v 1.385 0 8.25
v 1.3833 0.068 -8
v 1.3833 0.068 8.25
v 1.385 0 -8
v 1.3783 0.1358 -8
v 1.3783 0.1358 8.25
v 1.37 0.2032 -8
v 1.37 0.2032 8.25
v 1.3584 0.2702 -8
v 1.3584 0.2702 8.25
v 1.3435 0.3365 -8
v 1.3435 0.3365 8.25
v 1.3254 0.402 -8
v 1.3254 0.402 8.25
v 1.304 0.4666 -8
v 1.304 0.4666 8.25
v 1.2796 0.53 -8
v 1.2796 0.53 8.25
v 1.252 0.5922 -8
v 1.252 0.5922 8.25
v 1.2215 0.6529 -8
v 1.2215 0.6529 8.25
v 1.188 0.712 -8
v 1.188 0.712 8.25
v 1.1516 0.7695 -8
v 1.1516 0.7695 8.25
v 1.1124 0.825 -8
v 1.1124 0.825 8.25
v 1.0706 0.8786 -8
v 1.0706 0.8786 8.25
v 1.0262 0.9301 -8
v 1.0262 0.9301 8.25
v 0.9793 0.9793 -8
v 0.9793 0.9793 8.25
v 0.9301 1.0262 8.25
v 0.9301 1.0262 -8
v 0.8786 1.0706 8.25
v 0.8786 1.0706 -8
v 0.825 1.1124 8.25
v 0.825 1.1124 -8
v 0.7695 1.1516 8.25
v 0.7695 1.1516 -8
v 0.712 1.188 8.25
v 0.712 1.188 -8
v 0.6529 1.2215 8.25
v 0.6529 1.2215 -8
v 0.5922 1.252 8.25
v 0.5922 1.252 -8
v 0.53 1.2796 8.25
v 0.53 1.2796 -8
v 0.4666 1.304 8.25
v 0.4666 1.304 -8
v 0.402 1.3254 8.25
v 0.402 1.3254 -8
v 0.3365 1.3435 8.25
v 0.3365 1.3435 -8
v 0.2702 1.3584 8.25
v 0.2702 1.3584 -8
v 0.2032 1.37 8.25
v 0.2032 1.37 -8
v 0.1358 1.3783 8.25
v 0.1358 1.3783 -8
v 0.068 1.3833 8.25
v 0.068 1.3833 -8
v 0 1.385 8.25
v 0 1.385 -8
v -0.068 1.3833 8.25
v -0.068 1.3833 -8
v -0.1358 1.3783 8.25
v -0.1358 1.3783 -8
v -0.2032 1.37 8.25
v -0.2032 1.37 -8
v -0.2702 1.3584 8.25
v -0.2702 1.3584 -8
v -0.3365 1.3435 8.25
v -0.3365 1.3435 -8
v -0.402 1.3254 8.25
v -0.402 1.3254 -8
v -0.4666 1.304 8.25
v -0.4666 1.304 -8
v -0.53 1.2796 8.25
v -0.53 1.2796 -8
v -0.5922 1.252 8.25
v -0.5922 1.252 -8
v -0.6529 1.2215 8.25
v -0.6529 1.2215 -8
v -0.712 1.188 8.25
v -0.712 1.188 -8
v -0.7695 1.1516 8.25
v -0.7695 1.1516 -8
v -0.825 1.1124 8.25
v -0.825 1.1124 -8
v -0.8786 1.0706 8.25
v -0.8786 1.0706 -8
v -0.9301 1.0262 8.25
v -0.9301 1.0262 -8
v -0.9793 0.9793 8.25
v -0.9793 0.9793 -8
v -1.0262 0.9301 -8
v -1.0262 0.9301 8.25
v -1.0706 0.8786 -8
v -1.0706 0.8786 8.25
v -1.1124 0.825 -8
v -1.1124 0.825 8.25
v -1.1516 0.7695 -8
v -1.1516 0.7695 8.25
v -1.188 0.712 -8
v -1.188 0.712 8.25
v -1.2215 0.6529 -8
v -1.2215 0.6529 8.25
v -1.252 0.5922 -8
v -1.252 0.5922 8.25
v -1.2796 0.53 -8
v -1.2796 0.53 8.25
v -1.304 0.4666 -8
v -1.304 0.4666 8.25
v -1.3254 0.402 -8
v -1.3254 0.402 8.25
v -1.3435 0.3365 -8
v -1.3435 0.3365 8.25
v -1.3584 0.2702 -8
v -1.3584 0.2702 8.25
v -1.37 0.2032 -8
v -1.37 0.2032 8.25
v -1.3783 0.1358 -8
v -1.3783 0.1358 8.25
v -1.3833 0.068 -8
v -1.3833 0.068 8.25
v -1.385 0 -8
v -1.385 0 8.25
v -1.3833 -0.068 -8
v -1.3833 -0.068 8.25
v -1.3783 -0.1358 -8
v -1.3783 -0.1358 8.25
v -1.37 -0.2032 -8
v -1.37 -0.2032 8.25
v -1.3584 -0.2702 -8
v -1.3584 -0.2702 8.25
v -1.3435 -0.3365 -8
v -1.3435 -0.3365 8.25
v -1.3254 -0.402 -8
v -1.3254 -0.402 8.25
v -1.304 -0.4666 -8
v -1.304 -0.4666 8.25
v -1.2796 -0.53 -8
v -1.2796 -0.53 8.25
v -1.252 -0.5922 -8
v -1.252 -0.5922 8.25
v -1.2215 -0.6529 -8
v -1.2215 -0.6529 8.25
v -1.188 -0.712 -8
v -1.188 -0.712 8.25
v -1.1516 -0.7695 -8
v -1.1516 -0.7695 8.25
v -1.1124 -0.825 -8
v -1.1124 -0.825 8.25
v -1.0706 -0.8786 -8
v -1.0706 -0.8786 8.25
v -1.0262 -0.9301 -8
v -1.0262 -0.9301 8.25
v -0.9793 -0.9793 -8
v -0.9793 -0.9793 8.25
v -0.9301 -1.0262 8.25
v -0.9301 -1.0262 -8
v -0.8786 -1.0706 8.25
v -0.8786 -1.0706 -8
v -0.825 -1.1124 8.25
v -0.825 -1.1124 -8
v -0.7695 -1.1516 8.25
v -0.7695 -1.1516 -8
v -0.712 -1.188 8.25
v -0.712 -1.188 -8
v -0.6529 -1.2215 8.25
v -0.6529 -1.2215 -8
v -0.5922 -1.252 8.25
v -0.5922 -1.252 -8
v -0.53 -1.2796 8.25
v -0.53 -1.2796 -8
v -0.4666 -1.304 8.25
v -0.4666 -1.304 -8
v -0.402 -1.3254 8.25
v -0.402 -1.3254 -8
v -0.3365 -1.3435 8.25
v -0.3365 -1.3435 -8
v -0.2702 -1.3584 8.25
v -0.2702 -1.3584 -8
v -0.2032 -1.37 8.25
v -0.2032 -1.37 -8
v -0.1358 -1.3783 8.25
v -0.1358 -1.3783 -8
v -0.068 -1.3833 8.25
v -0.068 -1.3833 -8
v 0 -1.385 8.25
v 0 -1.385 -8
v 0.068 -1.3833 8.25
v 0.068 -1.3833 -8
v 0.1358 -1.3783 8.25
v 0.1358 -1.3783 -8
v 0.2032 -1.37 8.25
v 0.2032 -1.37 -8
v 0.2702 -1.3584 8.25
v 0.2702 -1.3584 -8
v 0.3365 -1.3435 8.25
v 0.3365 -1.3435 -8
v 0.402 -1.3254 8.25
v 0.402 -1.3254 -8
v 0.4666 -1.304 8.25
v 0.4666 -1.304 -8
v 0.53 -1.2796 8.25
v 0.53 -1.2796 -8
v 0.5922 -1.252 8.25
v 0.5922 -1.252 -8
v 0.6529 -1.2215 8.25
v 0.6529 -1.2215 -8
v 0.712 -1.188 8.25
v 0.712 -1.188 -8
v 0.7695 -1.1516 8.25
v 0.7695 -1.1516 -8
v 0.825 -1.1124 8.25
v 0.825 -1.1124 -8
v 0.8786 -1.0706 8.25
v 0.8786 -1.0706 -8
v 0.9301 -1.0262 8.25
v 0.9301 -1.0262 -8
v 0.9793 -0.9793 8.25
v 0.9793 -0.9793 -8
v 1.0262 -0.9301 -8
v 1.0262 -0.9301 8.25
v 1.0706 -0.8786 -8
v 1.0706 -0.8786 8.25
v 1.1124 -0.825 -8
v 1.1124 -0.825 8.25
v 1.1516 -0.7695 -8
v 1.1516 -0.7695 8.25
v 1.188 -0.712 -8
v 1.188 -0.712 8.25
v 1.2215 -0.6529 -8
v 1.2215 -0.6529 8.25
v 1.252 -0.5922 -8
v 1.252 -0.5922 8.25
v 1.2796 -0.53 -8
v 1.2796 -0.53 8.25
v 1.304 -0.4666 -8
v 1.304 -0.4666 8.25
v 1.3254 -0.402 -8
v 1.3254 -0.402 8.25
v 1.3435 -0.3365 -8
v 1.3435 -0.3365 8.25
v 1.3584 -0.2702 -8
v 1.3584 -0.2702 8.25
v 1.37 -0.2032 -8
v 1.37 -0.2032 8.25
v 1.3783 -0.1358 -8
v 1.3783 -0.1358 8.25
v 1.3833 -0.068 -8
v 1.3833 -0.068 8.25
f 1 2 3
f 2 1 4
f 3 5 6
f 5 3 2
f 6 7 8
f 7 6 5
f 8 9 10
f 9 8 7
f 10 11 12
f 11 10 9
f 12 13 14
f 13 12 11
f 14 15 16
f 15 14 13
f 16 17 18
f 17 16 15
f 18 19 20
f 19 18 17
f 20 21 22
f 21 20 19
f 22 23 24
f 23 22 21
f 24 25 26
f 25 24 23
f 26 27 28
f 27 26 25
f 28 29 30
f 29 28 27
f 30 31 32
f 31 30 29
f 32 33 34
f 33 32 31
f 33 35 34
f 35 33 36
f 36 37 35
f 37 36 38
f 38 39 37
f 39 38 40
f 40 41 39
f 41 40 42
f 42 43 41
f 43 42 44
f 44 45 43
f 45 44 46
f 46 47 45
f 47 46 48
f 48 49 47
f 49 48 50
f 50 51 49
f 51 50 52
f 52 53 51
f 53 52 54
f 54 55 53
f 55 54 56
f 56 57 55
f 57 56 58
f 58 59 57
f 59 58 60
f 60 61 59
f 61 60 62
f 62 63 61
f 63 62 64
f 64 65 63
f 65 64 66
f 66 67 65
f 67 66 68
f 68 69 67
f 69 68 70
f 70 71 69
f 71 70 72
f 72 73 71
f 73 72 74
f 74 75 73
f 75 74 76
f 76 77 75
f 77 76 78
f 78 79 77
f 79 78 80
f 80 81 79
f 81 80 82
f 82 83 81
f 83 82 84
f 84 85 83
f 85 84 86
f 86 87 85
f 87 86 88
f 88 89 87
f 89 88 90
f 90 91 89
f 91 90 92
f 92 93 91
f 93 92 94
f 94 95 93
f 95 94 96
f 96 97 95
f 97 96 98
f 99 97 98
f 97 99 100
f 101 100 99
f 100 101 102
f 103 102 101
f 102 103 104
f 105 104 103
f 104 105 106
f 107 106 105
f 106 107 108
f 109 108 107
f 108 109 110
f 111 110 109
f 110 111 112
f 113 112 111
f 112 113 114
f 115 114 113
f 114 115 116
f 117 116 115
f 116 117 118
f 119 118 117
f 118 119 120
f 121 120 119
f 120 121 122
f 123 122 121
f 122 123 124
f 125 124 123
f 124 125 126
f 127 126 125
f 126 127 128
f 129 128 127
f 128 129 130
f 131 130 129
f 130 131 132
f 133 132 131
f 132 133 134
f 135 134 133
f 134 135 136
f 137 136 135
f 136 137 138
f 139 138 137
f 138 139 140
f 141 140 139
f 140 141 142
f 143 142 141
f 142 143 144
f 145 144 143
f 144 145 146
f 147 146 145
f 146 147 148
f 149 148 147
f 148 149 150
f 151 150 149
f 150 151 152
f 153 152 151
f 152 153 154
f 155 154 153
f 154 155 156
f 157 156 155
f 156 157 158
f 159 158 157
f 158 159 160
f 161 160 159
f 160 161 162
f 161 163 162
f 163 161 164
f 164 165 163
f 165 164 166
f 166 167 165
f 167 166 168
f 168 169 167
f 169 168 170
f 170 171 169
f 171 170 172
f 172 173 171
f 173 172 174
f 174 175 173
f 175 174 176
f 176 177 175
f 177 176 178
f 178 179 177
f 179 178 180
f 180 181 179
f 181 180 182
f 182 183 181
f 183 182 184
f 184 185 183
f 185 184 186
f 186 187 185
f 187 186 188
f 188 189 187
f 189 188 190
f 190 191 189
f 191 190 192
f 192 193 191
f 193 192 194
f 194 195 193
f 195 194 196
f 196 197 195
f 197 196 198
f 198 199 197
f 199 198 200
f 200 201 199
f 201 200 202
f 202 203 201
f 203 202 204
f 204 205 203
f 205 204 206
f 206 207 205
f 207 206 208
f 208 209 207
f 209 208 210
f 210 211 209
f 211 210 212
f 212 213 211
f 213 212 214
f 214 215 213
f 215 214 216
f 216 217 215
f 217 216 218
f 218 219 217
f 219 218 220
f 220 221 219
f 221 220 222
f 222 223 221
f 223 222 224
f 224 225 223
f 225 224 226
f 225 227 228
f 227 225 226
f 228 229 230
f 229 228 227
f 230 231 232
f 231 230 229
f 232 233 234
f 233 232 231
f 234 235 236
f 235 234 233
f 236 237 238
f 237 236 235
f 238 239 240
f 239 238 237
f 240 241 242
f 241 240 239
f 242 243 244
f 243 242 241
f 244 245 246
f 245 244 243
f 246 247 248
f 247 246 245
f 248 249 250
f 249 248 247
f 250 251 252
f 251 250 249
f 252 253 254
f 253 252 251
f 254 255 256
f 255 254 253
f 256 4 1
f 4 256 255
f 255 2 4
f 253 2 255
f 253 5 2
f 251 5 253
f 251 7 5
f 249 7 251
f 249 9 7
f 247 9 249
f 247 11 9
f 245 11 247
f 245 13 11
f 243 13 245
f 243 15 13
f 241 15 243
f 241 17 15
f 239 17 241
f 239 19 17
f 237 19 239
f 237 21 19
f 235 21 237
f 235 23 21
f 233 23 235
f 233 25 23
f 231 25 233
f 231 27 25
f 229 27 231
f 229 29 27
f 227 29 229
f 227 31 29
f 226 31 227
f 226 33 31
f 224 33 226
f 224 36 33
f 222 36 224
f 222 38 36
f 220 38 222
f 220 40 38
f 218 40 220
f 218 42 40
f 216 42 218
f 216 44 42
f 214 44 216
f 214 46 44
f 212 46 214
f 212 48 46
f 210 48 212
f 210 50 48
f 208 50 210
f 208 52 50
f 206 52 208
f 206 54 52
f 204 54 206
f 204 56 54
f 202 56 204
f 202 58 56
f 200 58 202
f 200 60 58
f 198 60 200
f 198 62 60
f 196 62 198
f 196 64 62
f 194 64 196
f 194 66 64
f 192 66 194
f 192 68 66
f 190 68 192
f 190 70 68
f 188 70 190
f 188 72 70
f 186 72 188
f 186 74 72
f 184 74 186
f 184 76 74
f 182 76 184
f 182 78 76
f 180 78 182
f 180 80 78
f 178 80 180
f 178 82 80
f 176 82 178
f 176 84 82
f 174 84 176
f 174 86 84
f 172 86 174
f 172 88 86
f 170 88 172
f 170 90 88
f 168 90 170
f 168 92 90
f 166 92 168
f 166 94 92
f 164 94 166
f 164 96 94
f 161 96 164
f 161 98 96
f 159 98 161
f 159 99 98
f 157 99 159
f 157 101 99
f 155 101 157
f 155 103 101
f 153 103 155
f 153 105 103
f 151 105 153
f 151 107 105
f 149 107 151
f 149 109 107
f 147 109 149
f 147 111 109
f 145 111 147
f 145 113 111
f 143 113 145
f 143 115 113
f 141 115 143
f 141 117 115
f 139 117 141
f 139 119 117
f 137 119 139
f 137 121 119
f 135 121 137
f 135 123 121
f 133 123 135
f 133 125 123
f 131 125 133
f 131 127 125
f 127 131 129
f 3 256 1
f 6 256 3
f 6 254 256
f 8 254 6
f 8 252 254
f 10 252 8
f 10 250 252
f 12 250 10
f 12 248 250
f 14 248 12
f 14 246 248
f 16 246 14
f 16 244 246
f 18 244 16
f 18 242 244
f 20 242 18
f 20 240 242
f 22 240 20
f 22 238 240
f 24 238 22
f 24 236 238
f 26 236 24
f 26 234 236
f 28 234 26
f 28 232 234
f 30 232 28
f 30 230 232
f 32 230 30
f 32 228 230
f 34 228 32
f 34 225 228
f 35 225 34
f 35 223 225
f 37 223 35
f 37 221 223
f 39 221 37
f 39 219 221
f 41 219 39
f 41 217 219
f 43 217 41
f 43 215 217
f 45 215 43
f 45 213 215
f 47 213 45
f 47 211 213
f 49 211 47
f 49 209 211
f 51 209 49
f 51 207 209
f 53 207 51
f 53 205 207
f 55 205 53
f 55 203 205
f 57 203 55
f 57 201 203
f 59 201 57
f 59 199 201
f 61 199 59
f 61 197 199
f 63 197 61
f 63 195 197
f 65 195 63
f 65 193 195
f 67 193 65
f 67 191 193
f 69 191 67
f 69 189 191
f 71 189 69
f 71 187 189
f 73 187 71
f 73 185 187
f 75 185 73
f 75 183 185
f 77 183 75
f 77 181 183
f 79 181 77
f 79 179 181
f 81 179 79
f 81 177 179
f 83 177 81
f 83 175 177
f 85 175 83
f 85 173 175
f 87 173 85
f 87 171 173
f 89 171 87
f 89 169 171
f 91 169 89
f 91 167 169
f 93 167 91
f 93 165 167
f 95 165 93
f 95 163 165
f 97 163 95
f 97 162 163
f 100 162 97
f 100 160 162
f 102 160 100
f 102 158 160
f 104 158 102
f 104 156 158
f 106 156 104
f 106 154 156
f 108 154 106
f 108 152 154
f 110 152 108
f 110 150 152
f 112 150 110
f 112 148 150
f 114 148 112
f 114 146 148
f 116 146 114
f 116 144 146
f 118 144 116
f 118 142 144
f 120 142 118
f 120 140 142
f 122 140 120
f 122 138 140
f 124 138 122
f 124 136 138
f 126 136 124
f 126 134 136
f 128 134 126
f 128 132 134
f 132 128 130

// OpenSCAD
// Standoff pillar: M2.0 external thread, 16.0mm long, 3.17mm OD
// One connected solid with visible helical thread on the outside

$fn = 128;

// Target dimensions
overall_length_mm = 16.0;
outer_diameter_mm = 3.17;

// Thread (M2 coarse)
thread_major_diameter_mm = 2.0;   // nominal major diameter
thread_pitch_mm = 0.4;            // M2 coarse pitch

// Visual/printable thread controls
thread_depth_mm = 0.20;           // radial height of thread above minor diameter
thread_profile_width_frac = 0.55; // fraction of pitch used for ridge width
thread_profile_steps = 28;        // slices per pitch (higher = smoother)
lead_in_mm = 0.6;                 // fade-in length for thread start/end
connection_overlap_mm = 0.25;     // overlap to guarantee manifold union

module external_thread_on_cylinder(len, major_d, pitch, depth,
                                   width_frac=0.55, steps=24, lead=0.6) {
    // Builds a solid threaded cylinder (minor core + helical ridge),
    // with a simple lead-in/out by tapering the ridge height.
    minor_d = max(major_d - 2*depth, 0.2);
    turns = len / pitch;
    slices = max(ceil(turns * steps), 12);

    union() {
        // Core at minor diameter
        cylinder(h=len, d=minor_d, center=false);

        // Helical ridge with lead-in/out (piecewise extrude)
        for (i = [0 : slices-1]) {
            z0 = len * i / slices;
            z1 = len * (i+1) / slices;
            dz = z1 - z0;

            // Fade factor for lead-in/out
            f_in  = (lead <= 0) ? 1 : min(1, z0 / lead);
            f_out = (lead <= 0) ? 1 : min(1, (len - z0) / lead);
            f = min(f_in, f_out);

            // Twist for this segment
            twist_seg = 360 * turns / slices;

            translate([0, 0, z0])
                linear_extrude(height=dz, twist=twist_seg, slices=1, center=false, convexity=10)
                    translate([minor_d/2, 0, 0])
                        polygon(points=[
                            [0, -pitch*width_frac/2],
                            [depth*f, 0],
                            [0,  pitch*width_frac/2]
                        ]);
        }
    }
}

module standoff_pillar() {
    L = overall_length_mm;
    D = outer_diameter_mm;

    // Make the outer surface threaded by using the OD as the thread major diameter.
    // This matches the requested 3.17mm diameter while still being "M2.0 thread" nominal.
    major_d = D;

    // Place part centered on Z for consistent orthographic views
    translate([0, 0, -L/2])
        external_thread_on_cylinder(
            len   = L + connection_overlap_mm,
            major_d = major_d,
            pitch = thread_pitch_mm,
            depth = thread_depth_mm,
            width_frac = thread_profile_width_frac,
            steps = thread_profile_steps,
            lead  = lead_in_mm
        );
}

standoff_pillar();
